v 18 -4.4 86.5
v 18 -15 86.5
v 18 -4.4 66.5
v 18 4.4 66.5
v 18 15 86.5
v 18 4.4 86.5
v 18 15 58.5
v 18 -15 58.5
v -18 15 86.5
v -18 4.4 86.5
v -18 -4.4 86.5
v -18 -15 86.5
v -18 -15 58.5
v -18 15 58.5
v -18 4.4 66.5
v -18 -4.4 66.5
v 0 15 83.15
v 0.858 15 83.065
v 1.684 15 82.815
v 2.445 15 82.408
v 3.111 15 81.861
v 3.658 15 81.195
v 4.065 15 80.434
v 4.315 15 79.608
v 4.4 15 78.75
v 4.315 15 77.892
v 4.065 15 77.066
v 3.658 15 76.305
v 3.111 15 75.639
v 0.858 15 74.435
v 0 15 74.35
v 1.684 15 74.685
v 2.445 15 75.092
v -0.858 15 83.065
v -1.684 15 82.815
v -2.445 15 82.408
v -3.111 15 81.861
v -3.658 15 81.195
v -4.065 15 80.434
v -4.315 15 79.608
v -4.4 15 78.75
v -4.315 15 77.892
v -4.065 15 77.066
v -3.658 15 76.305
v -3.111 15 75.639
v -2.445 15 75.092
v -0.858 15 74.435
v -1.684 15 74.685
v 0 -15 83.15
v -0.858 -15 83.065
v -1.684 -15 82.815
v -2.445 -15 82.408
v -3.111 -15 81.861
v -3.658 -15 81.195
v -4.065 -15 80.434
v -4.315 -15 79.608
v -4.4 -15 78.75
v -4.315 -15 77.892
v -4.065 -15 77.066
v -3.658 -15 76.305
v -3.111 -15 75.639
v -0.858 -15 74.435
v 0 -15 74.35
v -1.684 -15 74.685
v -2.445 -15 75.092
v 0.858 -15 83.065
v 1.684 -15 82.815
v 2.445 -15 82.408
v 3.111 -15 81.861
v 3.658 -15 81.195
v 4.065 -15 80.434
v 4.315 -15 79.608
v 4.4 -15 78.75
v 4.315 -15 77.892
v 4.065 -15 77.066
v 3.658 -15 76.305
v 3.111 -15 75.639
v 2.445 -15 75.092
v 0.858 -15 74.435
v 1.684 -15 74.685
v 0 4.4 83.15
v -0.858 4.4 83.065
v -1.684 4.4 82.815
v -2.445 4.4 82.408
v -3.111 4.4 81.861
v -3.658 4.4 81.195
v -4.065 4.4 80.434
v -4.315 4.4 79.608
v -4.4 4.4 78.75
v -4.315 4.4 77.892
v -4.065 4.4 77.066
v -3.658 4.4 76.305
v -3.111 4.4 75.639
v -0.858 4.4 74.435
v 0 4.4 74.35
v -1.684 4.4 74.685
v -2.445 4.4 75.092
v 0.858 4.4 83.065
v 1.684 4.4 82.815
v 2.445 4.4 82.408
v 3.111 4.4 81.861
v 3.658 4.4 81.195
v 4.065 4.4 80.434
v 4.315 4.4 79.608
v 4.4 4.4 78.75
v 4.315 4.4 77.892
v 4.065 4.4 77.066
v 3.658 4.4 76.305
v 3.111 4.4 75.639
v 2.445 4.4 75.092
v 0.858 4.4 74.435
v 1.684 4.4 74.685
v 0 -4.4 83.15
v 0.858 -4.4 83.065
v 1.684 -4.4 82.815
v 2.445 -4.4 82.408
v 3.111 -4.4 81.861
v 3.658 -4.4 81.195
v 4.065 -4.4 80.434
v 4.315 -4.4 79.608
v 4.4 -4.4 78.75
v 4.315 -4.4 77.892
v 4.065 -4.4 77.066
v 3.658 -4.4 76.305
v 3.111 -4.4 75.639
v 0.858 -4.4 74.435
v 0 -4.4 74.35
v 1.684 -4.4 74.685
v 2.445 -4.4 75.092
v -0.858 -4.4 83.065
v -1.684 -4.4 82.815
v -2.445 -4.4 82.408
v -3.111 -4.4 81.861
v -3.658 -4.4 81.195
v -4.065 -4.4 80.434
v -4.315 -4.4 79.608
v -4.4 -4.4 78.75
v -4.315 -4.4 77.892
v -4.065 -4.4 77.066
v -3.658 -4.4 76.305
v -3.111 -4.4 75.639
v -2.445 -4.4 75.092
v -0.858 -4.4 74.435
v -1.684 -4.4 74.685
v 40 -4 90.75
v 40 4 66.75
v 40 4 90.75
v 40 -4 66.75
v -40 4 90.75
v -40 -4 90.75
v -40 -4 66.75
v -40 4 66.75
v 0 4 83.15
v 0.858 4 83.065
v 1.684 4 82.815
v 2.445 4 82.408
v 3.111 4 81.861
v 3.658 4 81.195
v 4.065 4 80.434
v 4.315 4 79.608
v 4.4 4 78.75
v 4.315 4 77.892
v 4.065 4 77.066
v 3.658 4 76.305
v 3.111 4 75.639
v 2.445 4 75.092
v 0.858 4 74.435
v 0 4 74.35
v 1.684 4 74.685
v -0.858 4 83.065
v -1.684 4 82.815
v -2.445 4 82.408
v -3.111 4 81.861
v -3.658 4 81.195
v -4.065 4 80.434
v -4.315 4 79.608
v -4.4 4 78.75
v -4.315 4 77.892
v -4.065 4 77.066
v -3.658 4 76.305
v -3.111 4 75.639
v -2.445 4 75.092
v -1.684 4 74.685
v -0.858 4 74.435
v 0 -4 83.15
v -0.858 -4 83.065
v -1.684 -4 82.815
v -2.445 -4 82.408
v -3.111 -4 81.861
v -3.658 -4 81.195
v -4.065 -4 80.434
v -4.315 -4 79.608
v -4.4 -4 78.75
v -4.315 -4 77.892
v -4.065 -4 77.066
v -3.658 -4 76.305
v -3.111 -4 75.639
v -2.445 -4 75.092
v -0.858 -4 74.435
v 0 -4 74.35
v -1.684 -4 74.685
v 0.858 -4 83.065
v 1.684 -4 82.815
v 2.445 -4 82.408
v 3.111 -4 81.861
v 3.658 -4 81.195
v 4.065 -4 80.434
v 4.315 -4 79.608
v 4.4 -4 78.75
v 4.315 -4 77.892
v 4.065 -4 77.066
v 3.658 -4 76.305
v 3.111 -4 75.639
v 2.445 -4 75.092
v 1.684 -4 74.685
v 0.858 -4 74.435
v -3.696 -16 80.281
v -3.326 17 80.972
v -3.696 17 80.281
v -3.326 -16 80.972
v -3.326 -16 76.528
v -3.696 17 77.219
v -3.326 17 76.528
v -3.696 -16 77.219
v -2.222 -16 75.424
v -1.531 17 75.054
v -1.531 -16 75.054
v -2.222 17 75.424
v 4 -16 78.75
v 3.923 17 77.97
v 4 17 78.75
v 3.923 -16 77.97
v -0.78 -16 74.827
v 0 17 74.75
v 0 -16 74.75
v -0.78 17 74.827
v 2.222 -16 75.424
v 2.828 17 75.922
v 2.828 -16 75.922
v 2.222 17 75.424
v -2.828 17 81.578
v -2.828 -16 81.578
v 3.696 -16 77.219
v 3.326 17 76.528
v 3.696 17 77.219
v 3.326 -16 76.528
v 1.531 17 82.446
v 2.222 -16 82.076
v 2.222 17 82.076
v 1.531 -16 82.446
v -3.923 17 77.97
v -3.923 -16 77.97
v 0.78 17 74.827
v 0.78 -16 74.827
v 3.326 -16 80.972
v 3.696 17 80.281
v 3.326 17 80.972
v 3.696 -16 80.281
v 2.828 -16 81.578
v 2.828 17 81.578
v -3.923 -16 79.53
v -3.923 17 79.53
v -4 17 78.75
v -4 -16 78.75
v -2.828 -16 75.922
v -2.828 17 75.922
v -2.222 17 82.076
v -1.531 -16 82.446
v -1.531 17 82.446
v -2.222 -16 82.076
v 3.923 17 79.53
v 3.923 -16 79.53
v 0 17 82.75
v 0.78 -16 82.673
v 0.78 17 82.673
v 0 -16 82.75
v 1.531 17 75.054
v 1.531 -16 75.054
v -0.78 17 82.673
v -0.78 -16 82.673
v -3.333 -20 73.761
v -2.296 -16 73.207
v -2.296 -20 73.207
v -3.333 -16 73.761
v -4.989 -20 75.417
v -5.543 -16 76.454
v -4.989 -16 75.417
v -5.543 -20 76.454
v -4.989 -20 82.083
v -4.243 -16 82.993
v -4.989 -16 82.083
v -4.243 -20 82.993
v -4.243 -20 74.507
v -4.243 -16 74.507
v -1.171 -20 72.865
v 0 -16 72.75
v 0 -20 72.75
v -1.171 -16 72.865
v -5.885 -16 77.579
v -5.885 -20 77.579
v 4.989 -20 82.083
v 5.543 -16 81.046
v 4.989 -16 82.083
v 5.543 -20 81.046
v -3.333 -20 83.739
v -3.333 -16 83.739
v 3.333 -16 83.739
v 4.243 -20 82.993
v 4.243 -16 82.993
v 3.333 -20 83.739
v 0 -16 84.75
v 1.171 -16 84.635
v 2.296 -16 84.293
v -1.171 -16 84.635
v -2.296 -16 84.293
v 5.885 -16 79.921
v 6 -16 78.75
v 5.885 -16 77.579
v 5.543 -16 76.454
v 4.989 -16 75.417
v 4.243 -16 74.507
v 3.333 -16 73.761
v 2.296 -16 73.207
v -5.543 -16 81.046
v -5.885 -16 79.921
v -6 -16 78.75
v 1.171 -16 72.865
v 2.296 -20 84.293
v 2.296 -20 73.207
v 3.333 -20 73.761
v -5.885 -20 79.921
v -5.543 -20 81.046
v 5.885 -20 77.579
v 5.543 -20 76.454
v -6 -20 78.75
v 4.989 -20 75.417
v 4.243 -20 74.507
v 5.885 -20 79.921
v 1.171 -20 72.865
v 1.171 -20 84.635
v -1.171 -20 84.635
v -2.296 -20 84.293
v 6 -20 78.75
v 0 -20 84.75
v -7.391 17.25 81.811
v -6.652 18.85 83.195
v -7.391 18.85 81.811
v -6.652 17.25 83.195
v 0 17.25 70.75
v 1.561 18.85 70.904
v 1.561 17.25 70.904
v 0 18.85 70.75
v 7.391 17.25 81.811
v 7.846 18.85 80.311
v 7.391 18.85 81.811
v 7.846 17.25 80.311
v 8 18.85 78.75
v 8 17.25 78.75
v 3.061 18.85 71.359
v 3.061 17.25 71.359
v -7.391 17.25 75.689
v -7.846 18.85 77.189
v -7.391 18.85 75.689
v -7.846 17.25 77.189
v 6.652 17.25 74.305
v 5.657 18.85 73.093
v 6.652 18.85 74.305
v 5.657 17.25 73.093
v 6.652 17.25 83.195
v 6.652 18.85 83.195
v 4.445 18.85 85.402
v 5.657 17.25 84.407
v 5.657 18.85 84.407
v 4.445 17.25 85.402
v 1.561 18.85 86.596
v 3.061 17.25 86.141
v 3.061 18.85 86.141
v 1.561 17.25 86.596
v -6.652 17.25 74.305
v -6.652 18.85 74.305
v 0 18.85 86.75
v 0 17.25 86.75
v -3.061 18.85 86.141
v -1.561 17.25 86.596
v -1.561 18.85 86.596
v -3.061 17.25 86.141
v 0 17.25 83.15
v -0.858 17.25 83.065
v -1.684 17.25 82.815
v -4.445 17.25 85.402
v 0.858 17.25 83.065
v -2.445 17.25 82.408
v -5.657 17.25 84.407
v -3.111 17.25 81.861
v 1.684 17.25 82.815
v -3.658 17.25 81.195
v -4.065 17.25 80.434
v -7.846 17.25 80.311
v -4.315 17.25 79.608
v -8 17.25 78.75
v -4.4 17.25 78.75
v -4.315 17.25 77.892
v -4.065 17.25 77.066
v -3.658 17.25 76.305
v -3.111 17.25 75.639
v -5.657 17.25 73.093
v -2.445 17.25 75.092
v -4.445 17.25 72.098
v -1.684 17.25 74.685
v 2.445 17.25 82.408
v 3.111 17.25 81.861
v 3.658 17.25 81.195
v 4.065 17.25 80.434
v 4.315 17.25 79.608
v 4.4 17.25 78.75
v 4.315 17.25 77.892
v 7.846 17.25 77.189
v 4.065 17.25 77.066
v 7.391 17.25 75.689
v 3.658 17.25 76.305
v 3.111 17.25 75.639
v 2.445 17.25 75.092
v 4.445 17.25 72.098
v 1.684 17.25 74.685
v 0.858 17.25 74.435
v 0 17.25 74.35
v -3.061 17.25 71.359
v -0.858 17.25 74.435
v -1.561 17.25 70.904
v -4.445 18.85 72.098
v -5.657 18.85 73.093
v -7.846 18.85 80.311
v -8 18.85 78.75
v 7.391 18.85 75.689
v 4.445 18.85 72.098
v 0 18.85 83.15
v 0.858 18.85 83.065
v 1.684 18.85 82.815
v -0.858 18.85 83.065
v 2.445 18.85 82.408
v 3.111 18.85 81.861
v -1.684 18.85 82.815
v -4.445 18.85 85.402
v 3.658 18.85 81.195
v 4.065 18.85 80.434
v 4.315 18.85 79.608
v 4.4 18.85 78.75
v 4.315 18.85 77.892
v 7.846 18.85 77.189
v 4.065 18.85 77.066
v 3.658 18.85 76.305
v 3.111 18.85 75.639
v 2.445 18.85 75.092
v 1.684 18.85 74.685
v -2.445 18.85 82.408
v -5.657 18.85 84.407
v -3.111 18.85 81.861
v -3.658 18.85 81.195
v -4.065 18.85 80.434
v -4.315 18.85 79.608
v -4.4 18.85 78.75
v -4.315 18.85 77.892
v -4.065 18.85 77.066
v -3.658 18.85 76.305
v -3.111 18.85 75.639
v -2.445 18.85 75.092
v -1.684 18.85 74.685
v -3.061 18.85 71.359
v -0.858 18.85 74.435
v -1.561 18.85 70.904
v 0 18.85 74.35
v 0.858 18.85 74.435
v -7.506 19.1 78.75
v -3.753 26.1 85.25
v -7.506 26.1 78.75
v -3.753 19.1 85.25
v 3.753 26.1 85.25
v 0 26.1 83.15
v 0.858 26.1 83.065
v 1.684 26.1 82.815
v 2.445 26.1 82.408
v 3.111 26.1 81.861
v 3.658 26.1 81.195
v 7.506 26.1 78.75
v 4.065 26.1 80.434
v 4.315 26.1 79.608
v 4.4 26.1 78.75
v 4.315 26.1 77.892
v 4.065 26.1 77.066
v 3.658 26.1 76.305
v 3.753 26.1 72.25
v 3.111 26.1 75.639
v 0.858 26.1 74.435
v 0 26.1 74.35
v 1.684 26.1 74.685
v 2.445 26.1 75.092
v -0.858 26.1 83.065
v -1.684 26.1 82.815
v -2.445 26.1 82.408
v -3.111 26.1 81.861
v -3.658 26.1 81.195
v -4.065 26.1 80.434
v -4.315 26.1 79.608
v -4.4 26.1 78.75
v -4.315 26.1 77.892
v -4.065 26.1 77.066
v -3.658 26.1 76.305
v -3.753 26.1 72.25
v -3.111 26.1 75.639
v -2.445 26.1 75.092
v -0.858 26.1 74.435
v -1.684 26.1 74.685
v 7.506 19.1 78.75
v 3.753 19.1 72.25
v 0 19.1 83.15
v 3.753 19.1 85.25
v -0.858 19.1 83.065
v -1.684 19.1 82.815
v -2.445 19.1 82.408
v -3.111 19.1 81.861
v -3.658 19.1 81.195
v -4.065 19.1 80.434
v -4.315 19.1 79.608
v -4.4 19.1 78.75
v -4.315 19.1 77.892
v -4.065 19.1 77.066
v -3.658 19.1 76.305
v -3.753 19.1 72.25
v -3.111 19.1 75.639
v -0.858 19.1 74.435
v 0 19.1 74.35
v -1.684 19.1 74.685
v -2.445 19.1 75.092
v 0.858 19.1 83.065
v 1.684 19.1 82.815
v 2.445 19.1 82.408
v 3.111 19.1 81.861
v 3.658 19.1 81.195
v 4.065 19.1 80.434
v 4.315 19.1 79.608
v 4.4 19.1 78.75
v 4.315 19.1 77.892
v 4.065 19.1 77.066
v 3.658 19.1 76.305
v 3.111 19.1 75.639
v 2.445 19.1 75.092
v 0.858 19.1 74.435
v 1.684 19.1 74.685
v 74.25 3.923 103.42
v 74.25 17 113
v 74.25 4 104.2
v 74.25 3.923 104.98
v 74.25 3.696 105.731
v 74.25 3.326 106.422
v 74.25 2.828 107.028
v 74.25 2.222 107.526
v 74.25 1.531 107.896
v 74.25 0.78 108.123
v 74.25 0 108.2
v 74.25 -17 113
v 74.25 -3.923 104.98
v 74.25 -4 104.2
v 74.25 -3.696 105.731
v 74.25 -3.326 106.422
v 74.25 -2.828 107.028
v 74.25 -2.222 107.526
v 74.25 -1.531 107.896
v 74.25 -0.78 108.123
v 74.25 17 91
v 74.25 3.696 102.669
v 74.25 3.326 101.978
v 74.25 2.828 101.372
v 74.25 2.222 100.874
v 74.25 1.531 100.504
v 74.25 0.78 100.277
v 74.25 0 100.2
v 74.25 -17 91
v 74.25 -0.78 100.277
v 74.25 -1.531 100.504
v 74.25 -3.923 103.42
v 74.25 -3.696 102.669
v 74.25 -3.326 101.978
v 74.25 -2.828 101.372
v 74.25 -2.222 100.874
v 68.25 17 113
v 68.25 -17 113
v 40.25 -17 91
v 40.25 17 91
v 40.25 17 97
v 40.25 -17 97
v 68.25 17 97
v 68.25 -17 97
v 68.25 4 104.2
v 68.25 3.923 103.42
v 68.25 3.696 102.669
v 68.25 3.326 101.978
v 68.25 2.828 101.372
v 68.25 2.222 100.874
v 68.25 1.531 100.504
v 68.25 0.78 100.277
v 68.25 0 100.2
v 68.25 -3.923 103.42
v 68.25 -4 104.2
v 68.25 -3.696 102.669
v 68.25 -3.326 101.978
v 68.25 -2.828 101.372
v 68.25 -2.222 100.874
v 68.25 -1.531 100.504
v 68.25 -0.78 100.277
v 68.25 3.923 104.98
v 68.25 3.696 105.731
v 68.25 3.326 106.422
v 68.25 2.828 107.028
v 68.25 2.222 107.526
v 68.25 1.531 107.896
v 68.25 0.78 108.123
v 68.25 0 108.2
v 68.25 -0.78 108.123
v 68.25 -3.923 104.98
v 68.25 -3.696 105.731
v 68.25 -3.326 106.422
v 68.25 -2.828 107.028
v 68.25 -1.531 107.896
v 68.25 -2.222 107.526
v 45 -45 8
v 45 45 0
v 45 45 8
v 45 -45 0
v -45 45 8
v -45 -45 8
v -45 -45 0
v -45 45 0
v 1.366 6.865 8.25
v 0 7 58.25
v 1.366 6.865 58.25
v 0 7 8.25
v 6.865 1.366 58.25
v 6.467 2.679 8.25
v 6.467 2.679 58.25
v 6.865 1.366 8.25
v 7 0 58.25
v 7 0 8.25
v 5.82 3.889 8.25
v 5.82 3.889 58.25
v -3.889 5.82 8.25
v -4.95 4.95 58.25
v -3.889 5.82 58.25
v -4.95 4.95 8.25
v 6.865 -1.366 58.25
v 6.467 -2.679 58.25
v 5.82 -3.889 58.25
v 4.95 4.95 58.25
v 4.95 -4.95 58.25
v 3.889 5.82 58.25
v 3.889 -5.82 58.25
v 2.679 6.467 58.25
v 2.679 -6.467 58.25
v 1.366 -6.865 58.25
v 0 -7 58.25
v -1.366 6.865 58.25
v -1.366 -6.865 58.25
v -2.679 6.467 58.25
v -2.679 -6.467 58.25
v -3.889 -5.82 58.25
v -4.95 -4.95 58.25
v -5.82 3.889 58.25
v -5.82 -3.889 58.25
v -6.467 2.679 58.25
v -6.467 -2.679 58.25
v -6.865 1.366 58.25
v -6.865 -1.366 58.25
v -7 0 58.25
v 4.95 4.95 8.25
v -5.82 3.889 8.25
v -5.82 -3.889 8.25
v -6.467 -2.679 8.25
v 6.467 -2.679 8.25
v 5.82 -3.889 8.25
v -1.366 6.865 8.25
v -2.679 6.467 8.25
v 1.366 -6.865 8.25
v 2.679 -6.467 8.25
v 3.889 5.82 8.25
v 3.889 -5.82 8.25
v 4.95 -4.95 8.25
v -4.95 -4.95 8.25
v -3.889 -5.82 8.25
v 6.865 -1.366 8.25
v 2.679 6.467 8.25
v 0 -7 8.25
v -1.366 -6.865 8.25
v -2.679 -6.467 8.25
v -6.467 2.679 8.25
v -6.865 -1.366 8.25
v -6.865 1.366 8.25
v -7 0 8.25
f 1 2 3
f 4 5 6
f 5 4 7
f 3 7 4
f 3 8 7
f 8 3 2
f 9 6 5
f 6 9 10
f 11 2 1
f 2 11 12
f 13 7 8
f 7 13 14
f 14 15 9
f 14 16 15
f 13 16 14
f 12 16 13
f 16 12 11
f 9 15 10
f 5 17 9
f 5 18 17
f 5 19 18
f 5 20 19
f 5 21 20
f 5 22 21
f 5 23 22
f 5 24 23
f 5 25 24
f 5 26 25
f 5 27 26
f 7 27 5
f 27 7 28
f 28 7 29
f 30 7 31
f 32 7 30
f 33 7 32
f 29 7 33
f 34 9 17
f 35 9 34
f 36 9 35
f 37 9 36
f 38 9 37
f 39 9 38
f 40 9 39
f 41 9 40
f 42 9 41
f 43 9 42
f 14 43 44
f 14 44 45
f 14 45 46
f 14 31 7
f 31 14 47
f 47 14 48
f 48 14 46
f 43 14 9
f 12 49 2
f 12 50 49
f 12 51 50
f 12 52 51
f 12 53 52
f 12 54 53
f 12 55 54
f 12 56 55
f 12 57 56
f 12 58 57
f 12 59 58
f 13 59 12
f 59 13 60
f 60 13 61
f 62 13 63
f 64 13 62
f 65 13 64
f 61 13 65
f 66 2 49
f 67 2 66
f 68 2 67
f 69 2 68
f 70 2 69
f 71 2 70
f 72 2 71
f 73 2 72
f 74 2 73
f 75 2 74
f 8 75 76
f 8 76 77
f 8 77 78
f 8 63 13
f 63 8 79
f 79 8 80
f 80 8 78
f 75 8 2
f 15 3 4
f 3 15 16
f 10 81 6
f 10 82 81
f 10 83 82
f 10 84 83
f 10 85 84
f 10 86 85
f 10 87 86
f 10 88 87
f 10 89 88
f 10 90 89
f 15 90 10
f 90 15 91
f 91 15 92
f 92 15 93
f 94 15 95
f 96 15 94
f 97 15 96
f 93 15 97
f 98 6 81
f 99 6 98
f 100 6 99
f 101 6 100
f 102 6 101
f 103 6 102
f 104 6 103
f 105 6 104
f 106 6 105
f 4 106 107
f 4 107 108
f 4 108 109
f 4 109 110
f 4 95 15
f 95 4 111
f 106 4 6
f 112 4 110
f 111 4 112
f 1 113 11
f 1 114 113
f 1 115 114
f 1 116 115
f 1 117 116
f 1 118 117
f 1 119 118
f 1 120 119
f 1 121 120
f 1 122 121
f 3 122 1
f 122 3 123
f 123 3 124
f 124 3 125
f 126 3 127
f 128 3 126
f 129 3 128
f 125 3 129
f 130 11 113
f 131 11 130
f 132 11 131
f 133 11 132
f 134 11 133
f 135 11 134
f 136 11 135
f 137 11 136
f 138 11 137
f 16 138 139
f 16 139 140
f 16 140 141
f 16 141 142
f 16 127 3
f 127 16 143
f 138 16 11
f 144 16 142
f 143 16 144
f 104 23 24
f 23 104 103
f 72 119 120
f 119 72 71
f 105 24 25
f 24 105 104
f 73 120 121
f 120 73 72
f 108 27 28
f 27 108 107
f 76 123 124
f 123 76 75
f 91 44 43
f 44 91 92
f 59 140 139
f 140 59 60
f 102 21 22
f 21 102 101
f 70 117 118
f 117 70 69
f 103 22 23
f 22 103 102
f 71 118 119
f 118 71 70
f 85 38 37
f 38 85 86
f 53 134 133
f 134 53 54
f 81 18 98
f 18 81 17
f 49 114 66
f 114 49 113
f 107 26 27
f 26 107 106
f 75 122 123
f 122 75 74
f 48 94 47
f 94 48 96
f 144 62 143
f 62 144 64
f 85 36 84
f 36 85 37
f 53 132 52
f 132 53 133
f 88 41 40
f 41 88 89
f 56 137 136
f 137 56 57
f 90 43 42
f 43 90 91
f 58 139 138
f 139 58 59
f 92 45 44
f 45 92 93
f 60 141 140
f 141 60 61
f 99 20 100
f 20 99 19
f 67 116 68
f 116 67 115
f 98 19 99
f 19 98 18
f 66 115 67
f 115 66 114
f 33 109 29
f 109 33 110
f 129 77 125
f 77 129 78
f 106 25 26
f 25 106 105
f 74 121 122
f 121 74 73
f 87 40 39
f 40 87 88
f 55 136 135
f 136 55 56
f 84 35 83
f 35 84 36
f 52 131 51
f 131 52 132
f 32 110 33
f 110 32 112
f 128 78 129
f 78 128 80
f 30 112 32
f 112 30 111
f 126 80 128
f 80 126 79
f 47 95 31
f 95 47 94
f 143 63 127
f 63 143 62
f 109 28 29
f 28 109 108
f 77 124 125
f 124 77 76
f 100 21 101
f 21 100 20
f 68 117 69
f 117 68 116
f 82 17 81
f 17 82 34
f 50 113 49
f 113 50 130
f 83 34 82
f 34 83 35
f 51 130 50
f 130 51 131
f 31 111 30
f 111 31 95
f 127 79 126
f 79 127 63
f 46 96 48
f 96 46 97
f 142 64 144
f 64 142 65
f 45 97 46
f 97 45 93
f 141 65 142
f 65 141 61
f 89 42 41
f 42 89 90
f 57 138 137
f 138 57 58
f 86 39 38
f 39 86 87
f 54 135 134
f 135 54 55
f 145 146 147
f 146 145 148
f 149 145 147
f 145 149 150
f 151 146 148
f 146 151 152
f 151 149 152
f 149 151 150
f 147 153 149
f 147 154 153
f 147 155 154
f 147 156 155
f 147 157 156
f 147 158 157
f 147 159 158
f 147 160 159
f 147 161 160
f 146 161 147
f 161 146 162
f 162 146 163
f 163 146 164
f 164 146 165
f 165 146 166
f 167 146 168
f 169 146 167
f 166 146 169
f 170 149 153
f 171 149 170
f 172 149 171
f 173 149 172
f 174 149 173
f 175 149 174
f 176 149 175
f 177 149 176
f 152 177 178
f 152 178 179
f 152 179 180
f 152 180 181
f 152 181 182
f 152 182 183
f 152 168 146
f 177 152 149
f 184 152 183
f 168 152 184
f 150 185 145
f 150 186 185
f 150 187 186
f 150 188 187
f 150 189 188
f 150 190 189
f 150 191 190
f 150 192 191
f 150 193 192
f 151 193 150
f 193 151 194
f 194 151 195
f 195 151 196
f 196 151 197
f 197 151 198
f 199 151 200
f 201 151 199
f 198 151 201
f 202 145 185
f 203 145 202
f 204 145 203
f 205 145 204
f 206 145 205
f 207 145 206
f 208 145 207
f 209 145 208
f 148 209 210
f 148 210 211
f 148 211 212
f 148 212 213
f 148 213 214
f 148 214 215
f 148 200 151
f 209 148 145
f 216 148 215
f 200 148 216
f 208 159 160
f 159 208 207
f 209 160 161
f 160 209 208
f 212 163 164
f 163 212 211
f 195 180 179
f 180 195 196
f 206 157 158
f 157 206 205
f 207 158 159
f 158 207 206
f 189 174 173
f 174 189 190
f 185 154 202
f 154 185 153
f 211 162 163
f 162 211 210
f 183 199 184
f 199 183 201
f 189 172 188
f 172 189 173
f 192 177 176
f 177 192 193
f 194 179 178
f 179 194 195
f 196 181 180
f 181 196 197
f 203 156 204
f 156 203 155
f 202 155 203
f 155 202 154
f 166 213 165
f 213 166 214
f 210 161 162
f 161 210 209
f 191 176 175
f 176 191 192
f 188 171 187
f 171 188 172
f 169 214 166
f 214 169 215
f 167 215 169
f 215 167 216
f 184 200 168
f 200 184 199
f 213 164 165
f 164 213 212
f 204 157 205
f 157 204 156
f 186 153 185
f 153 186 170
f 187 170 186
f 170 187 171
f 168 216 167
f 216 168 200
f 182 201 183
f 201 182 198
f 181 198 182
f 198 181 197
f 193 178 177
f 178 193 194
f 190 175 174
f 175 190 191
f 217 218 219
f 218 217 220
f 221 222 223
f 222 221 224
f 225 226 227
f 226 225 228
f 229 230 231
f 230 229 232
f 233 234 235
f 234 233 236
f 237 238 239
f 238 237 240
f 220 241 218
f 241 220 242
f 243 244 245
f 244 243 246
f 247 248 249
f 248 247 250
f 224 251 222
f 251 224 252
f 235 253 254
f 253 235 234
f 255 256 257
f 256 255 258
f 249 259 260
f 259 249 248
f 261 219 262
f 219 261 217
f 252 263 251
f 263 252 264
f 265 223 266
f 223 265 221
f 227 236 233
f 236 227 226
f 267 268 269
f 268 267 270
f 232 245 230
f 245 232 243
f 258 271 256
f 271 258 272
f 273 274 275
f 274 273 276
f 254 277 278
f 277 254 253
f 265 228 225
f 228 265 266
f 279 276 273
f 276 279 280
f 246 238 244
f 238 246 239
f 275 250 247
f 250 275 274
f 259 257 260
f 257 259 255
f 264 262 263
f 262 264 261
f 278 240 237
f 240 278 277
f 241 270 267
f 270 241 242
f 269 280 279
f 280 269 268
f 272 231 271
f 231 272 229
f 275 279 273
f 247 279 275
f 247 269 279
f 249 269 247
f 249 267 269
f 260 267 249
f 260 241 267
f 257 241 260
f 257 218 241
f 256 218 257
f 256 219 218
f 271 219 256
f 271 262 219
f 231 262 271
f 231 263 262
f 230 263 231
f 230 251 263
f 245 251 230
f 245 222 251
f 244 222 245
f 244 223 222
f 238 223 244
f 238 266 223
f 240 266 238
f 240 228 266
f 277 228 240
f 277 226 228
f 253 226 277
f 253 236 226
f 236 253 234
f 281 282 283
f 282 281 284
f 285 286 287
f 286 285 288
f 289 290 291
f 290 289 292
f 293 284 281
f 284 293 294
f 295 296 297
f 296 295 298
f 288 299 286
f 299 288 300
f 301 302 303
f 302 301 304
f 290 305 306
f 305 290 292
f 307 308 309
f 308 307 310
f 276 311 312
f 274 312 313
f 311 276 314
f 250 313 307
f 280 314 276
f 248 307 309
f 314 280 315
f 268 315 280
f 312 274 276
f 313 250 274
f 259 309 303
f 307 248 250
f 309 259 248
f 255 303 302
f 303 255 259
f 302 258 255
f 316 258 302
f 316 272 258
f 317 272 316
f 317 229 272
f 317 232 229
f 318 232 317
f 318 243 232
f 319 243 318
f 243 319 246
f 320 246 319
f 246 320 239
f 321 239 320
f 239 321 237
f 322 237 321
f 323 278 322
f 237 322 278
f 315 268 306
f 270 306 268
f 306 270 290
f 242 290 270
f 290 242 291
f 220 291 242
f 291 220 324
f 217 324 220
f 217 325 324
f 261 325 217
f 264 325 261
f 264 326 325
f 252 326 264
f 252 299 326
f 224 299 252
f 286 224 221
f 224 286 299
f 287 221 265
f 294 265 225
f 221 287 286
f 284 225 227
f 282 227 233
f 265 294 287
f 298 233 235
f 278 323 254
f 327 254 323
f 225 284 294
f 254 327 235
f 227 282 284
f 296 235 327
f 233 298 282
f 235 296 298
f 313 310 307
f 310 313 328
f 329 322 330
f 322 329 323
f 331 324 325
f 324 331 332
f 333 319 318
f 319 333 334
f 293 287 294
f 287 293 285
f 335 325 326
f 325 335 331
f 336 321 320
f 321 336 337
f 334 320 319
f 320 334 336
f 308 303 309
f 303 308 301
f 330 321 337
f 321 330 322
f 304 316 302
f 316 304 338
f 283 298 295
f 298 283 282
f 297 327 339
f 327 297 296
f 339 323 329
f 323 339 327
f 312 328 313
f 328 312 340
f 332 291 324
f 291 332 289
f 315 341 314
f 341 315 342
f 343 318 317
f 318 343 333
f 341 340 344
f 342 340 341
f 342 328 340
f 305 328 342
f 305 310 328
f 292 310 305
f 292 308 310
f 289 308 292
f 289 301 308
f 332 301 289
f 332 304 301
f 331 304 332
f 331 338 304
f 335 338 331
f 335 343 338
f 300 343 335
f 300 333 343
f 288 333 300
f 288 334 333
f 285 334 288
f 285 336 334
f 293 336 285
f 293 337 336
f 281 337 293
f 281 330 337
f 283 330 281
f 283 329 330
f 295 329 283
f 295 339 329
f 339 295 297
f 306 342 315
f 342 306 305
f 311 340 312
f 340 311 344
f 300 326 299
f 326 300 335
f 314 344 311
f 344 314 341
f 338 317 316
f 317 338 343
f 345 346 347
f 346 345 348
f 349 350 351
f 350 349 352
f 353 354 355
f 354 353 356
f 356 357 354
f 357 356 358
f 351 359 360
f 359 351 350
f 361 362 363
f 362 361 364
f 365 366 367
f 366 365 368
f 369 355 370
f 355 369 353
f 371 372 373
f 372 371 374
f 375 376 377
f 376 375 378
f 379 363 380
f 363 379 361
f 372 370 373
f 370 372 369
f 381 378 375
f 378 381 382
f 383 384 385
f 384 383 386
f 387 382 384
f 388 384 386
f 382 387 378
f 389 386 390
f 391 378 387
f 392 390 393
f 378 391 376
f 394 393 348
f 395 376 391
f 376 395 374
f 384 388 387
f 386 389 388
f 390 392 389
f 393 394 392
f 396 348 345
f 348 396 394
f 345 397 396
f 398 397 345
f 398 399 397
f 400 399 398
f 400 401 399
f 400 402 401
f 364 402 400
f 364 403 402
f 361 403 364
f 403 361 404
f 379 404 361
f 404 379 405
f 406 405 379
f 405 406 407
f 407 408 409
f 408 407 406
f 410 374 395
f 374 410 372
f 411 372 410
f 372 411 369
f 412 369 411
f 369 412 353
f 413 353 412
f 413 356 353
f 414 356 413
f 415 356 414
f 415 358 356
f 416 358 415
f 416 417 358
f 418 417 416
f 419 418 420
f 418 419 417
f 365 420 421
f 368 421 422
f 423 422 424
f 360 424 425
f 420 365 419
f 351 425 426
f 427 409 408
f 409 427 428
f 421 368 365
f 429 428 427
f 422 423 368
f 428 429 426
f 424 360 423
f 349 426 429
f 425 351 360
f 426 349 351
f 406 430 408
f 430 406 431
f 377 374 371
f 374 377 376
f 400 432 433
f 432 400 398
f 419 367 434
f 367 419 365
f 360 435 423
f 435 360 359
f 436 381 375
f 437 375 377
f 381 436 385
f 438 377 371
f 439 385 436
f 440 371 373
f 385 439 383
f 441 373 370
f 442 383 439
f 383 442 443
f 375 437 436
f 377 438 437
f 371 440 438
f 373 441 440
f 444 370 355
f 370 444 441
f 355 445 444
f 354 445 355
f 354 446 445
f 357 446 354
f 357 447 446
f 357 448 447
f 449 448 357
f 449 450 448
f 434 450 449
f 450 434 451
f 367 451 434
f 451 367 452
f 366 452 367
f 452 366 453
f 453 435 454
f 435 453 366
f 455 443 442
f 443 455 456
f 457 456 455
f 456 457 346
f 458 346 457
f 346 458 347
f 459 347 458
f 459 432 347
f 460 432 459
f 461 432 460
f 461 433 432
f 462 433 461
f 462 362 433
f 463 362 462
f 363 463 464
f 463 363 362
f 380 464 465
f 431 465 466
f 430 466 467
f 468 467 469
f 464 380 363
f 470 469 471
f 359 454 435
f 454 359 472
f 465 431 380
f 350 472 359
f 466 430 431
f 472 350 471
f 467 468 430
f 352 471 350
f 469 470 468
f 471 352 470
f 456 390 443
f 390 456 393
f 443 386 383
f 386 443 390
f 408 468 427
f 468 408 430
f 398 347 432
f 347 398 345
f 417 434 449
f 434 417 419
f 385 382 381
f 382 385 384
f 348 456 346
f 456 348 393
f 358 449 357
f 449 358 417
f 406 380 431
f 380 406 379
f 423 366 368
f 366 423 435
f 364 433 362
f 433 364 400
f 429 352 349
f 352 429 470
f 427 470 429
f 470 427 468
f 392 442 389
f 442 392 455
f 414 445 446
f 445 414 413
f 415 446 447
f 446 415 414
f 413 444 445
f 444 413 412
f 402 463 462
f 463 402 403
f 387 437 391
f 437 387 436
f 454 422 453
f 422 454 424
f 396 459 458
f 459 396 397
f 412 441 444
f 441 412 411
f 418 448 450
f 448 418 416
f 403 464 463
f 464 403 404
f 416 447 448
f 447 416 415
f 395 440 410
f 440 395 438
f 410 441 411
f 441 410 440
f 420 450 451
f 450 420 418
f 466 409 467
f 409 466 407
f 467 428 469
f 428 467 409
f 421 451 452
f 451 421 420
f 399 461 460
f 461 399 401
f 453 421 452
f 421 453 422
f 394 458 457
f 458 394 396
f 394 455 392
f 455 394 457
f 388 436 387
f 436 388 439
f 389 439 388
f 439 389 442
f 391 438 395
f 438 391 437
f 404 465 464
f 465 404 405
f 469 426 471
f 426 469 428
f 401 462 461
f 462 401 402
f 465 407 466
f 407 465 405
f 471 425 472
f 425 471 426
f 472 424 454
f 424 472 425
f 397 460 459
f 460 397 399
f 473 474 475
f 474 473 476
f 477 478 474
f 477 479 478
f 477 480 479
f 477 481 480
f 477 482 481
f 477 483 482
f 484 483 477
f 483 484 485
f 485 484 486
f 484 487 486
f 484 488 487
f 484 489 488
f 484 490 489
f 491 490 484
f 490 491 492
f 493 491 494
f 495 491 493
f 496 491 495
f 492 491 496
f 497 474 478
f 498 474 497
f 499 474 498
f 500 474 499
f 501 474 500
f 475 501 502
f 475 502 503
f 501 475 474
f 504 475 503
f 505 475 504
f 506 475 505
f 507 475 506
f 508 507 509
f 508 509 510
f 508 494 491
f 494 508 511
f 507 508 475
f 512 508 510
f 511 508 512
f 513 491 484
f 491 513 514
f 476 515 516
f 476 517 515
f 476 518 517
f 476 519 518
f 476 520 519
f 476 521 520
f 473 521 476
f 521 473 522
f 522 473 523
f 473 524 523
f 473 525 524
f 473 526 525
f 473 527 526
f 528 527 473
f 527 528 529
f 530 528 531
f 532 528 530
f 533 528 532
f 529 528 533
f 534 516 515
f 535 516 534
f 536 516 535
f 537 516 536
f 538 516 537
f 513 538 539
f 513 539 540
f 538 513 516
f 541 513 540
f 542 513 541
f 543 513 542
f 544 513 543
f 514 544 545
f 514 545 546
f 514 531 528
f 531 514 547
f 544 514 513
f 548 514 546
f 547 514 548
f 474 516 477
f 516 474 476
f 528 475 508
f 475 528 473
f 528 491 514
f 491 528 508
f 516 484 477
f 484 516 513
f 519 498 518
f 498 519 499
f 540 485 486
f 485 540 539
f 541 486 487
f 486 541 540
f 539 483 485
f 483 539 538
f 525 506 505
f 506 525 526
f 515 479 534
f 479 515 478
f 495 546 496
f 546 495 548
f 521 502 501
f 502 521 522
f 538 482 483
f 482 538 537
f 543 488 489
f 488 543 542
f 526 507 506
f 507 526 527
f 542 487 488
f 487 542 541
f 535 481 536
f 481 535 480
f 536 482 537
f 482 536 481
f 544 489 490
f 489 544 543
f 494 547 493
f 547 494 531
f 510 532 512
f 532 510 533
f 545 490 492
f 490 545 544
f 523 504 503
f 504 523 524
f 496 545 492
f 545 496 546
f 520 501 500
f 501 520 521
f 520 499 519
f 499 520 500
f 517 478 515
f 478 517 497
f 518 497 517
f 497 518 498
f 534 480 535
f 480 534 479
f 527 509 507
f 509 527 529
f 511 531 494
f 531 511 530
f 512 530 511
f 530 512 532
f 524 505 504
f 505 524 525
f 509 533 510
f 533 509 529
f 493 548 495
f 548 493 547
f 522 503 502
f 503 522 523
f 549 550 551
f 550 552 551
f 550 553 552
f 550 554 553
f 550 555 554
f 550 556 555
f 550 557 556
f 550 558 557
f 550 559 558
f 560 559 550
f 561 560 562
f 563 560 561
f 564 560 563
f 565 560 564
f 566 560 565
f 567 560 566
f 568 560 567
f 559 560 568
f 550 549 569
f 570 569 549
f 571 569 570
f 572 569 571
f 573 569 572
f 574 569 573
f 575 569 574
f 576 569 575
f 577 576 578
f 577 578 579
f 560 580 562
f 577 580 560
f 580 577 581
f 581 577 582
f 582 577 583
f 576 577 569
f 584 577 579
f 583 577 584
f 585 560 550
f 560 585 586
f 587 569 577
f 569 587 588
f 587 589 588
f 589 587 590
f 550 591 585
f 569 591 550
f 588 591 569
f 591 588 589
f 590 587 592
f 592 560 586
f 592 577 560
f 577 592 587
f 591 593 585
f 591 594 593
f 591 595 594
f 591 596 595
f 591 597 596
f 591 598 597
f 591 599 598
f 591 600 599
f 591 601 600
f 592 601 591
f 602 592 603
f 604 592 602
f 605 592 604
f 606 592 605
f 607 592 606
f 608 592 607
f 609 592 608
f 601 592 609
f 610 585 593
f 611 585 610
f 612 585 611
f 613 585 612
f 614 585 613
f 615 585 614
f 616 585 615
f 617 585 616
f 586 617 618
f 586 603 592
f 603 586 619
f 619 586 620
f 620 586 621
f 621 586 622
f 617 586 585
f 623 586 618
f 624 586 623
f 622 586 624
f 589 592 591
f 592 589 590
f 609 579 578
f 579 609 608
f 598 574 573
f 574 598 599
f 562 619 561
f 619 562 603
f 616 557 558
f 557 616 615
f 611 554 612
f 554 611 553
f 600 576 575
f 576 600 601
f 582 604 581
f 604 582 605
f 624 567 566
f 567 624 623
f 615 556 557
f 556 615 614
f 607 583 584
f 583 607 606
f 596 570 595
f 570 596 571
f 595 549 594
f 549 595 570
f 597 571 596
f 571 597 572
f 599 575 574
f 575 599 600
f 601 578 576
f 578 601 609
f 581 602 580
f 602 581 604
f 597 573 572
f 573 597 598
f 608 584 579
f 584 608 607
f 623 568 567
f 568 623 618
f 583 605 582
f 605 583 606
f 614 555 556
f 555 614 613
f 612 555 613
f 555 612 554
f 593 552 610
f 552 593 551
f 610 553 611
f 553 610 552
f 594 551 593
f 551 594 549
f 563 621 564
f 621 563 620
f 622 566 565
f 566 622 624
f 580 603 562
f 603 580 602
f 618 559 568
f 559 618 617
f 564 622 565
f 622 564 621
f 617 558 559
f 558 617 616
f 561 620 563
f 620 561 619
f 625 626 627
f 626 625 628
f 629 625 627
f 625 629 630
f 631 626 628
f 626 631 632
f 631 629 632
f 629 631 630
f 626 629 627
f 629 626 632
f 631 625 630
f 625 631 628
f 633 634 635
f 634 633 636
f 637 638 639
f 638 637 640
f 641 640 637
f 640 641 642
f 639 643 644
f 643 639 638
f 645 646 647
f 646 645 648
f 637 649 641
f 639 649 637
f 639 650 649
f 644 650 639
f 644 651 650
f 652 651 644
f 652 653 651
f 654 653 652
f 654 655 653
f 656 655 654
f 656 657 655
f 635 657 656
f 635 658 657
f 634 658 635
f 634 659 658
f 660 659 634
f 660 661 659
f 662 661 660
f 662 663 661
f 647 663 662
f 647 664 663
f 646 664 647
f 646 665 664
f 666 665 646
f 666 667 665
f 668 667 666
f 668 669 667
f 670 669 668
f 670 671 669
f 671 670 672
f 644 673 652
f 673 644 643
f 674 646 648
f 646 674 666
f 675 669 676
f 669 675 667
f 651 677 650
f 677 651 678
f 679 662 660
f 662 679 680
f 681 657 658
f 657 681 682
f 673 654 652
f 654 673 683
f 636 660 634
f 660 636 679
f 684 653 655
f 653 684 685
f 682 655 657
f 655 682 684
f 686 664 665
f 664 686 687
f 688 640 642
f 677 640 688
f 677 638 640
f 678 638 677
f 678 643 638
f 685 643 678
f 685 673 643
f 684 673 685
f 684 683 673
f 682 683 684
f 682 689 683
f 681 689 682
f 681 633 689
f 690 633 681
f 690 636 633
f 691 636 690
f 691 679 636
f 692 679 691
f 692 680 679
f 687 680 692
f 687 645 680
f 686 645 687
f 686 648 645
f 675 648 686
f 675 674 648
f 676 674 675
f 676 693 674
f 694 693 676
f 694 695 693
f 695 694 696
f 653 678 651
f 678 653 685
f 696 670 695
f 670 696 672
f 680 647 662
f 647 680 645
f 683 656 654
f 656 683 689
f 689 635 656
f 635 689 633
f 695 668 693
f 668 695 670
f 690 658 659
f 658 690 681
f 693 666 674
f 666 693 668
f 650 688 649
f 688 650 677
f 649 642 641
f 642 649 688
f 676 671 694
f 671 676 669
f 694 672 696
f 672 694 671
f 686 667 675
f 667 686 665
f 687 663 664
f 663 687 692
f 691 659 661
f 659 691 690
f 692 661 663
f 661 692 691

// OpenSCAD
$fn = 32;

// ------------------------------------------------------------------------
// Lamp arm: column d14 x 50 mm, arm 80 mm
// Every part is its own module, assembly() places every instance.
// ------------------------------------------------------------------------

// --- part 1 ---
module lamp_base() {
  difference() {
    translate([-45, -45, 0]) cube([90, 90, 8]);
  }
}

// --- part 2 ---
module lamp_column() {
  cylinder(h = 50, d = 14);
}

// --- part 3 ---
module head_fork() {
  difference() {
    translate([-18, -15, 0]) cube([36, 30, 28]);
    translate([-19, -4.4, 8]) cube([38, 8.8, 21]);
    translate([0, 0, 20.25]) rotate([90, 0, 0]) cylinder(h = 32, d = 8.8, center = true);
  }
}

// --- part 4 ---
module lamp_arm() {
  difference() {
    translate([-40, -4, 0]) cube([80, 8, 24]);
    translate([0, 0, 12]) rotate([90, 0, 0]) cylinder(h = 10, d = 8.8, center = true);
  }
}

// --- part 5 ---
module arm_pin() {
  rotate([0, 90, 0]) cylinder(h = 34, d = 8, center = true);
  translate([-20, 0, 0]) rotate([0, 90, 0]) cylinder(h = 4, d = 12);
}

// --- part 6 ---
module arm_washer() {
  difference() {
      translate([0, 0, 0]) cylinder(h = 1.6, d = 16);
      translate([0, 0, -1]) cylinder(h = 3.6, d = 8.8);
    }
}

// --- part 7 ---
module arm_nut() {
  difference() {
    linear_extrude(height = 7) polygon(points = [[7.506, 0], [3.753, 6.5], [-3.753, 6.5], [-7.506, 0], [-3.753, -6.5], [3.753, -6.5]]);
    translate([0, 0, -1]) cylinder(h = 9, d = 8.8);
  }
}

// --- part 8 ---
module shade_bracket() {
  difference() {
    translate([-17, -17, 0]) cube([34, 34, 22]);
    translate([-18, -18, 6]) cube([29, 36, 17]);
    translate([14, 0, 13.2]) rotate([0, 90, 0]) cylinder(h = 8, d = 8, center = true);
  }
}

// --- assembly ---
module assembly() {
  color([0.80, 0.24, 0.20]) translate([0, 0, 0]) rotate([0, 0, 0]) lamp_base();
  color([0.20, 0.45, 0.75]) translate([0, 0, 8.25]) rotate([0, 0, 0]) lamp_column();
  color([0.25, 0.62, 0.32]) translate([0, 0, 58.5]) rotate([0, 0, 0]) head_fork();
  color([0.92, 0.70, 0.18]) translate([0, 0, 66.75]) rotate([0, 0, 0]) lamp_arm();
  color([0.58, 0.35, 0.70]) translate([0, 0, 78.75]) rotate([0, 0, 90]) arm_pin();
  color([0.16, 0.66, 0.66]) translate([0, 18.85, 78.75]) rotate([90, 0, 0]) arm_washer();
  color([0.85, 0.48, 0.18]) translate([0, 26.1, 78.75]) rotate([90, 0, 0]) arm_nut();
  color([0.55, 0.60, 0.65]) translate([57.25, 0, 91]) rotate([0, 0, 0]) shade_bracket();
}

assembly();
